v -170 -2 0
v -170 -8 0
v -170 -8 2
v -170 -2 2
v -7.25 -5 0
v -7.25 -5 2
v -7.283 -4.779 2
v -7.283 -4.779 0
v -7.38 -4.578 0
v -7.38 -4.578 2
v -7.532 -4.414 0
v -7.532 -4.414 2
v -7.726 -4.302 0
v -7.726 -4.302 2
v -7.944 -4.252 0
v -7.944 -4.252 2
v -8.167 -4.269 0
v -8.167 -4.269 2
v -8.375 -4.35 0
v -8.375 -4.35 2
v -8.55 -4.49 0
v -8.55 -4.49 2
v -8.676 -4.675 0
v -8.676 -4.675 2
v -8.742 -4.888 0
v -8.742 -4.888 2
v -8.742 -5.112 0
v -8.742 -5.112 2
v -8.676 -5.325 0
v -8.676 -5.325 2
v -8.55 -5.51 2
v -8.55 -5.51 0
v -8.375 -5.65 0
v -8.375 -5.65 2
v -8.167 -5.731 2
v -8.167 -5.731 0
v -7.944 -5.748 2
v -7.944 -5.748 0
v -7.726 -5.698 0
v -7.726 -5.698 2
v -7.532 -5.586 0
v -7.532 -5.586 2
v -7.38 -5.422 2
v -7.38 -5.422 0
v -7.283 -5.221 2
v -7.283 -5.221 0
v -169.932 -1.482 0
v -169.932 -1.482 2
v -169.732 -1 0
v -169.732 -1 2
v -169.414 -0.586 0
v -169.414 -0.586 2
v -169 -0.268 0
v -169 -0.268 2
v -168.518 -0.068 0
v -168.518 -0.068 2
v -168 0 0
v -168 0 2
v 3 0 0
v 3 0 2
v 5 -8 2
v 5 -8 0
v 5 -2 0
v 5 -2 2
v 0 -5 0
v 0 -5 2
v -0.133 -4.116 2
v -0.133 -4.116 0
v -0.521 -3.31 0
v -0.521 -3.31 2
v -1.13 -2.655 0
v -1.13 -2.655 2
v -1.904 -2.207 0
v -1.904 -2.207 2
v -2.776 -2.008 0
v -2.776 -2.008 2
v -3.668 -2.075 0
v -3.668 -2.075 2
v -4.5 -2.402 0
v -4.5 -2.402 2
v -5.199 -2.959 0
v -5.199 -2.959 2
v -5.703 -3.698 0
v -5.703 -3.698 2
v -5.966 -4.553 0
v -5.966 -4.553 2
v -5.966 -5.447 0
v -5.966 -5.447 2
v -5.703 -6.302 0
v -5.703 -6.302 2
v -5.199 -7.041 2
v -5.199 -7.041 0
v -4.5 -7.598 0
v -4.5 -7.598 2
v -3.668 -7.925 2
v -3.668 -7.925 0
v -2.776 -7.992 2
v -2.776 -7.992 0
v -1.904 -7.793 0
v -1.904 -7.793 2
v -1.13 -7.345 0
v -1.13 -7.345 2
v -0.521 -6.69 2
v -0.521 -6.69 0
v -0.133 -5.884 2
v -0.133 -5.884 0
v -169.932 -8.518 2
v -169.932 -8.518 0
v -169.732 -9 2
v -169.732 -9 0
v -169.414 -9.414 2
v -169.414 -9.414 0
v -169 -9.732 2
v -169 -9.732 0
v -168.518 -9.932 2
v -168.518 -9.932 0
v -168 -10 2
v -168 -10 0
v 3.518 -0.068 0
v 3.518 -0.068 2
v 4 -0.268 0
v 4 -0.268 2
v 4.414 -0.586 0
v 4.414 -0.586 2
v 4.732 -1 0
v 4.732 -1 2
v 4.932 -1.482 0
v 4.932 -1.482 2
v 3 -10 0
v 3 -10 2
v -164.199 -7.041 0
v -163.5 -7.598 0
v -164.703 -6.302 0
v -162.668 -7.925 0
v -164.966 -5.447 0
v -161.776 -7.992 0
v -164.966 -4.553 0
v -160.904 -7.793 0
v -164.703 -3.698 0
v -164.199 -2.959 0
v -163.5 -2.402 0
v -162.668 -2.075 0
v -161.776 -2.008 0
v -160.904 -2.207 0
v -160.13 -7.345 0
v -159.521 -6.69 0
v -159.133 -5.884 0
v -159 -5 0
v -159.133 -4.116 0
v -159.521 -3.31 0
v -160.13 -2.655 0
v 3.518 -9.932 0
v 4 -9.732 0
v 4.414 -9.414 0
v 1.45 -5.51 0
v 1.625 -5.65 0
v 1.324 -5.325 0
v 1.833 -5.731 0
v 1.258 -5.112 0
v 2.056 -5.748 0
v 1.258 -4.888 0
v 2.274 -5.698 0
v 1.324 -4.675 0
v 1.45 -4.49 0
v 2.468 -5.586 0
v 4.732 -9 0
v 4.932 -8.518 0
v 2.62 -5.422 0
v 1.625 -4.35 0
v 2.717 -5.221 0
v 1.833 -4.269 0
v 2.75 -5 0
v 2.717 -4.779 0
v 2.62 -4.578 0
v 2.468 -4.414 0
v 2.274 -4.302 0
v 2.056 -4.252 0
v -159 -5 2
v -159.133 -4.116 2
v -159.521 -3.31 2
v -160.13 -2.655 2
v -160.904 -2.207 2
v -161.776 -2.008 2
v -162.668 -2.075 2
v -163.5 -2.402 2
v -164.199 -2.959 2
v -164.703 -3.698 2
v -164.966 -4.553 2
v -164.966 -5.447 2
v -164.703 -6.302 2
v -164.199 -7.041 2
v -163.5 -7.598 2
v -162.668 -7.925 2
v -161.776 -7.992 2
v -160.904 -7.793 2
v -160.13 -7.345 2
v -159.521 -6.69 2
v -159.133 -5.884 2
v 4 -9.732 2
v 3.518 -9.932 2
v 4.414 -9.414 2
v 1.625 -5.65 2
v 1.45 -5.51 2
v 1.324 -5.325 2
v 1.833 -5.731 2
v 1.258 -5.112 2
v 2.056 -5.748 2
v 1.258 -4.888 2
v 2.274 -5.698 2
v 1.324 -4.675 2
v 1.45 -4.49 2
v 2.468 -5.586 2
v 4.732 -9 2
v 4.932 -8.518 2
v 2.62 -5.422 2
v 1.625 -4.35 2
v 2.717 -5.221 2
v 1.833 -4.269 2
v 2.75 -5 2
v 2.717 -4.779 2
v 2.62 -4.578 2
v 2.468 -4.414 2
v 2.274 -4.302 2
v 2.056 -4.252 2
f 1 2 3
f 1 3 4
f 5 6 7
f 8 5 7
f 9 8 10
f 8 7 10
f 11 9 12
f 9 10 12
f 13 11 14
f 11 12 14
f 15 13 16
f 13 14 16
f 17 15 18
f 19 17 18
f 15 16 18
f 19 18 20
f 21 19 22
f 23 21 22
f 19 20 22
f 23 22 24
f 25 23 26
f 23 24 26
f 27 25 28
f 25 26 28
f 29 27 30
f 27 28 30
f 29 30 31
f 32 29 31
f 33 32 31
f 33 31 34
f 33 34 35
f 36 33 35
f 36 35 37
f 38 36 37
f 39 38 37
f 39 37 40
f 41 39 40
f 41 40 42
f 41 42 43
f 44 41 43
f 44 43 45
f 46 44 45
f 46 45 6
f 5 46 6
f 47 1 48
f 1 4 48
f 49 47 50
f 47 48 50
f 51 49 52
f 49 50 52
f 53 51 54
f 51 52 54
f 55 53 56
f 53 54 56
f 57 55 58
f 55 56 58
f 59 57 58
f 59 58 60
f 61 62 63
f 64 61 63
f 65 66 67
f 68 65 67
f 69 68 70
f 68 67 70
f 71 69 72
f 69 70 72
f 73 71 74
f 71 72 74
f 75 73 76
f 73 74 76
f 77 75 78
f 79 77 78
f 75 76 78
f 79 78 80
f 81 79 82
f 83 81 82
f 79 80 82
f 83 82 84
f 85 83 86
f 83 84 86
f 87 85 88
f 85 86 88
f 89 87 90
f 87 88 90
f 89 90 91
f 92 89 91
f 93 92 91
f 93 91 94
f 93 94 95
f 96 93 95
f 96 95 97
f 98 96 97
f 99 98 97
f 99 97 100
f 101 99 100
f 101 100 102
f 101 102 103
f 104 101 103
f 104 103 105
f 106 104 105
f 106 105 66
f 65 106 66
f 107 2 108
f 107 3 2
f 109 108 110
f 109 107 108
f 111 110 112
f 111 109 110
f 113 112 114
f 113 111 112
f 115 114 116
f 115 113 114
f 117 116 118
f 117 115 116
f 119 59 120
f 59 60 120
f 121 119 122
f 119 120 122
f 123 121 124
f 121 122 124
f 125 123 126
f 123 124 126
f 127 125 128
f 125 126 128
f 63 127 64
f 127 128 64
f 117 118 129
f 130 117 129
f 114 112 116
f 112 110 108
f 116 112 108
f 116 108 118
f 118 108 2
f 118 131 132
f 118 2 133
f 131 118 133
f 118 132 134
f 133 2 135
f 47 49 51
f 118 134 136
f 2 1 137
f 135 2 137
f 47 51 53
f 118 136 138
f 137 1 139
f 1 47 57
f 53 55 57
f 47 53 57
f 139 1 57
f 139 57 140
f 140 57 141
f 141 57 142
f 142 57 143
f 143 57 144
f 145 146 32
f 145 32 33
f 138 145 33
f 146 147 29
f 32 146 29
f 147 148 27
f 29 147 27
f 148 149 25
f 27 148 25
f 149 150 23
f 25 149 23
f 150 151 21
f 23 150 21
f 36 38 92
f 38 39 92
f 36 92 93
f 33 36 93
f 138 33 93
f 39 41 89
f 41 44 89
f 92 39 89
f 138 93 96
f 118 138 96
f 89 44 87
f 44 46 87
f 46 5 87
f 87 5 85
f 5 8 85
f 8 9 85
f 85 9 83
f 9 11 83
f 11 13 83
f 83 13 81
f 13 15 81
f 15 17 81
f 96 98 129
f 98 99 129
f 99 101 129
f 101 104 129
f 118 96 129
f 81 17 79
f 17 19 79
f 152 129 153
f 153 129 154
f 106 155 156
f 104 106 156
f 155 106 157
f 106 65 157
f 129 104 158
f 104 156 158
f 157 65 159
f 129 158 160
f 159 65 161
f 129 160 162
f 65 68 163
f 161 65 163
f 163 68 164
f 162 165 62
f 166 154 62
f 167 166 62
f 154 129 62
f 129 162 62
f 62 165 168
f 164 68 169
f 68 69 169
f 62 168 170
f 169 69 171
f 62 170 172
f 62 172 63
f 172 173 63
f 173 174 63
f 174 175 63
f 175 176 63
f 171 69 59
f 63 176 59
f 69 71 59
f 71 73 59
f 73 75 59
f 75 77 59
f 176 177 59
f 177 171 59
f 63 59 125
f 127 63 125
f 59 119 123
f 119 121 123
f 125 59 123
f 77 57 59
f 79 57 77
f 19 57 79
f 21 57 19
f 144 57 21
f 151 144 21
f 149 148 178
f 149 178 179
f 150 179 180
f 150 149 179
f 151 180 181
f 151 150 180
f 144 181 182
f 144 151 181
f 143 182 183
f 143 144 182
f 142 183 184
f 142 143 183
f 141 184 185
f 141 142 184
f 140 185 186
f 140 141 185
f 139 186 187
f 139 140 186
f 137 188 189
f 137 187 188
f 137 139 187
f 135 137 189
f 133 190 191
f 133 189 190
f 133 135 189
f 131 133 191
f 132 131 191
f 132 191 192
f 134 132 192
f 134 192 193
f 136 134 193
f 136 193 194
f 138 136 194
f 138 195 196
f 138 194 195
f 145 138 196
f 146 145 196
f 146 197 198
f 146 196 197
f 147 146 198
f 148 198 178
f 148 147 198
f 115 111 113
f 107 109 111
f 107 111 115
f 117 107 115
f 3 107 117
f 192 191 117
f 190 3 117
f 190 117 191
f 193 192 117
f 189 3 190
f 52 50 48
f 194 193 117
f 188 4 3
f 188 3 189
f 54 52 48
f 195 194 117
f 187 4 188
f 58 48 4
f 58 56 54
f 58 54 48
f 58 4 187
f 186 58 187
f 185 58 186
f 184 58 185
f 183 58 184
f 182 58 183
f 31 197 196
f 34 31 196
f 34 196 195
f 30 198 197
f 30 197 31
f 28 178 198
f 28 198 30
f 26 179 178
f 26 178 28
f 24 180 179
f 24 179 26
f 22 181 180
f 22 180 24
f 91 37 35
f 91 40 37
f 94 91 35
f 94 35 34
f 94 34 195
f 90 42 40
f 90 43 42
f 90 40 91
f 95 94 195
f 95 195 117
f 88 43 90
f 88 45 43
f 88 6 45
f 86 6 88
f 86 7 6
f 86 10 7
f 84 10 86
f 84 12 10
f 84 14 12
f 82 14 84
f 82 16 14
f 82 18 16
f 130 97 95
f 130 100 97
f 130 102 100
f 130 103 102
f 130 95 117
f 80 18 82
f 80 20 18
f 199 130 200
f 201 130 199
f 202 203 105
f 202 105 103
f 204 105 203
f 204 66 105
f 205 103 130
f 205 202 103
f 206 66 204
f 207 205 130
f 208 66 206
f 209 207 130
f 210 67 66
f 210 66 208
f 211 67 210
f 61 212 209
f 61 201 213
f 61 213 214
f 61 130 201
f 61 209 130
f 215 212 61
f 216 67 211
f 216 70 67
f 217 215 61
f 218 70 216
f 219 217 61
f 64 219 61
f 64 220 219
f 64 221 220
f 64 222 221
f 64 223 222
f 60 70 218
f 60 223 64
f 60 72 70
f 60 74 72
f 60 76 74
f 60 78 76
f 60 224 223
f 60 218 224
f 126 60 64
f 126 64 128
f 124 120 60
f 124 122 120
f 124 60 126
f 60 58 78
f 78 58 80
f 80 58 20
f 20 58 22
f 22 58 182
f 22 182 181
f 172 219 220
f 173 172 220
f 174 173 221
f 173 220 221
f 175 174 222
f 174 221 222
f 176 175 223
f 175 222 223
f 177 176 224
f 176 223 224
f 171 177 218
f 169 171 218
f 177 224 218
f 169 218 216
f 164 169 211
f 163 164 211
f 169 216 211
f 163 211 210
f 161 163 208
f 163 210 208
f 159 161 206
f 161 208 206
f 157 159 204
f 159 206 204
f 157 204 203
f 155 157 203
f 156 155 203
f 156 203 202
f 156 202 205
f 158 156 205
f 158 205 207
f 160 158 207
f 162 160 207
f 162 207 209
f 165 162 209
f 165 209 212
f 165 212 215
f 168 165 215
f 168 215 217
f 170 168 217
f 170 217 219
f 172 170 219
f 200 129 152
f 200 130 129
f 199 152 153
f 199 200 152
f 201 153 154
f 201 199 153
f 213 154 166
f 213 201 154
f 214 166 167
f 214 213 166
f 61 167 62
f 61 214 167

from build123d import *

# Parameters (mm, degrees)
SKETCH_1_W               = 175
SKETCH_1_H               = 10
EXTRUDE_1_DEPTH          = 2
CUT_EXTRUDE_1_DEPTH      = 12
CUT_EXTRUDE_1_DEPTH_BACK = 15
SKETCH_2_R               = 3
SKETCH_3_R               = 3
SKETCH_3_R_2             = 0.75
CUT_EXTRUDE_2_DEPTH      = 10
FILLET_1_R               = 2


with BuildPart() as part:
    # 草图1 → 凸台-拉伸1 (new body)
    with BuildSketch(Plane.XY):
        with Locations((-82.5, -5)):
            Rectangle(SKETCH_1_W, SKETCH_1_H)
    extrude(amount=EXTRUDE_1_DEPTH)

    # 草图2 → 切除-拉伸1 (cut, two sides: drawn at the far end of the back side and taken through both)
    with BuildSketch(Plane.XY.offset(2).offset(-CUT_EXTRUDE_1_DEPTH_BACK)):
        with Locations((-162, -5)):
            Circle(SKETCH_2_R)
    extrude(amount=CUT_EXTRUDE_1_DEPTH + CUT_EXTRUDE_1_DEPTH_BACK, mode=Mode.SUBTRACT)

    # 草图3 → 切除-拉伸2 (cut)
    with BuildSketch(Plane.XY.offset(2)):
        with Locations((-3, -5)):
            Circle(SKETCH_3_R)
        with Locations((-8, -5)):
            Circle(SKETCH_3_R_2)
        with Locations((2, -5)):
            Circle(SKETCH_3_R_2)
    extrude(amount=-CUT_EXTRUDE_2_DEPTH, mode=Mode.SUBTRACT)

    # 圆角1
    fillet_1_edges = [part.edges().sort_by_distance(p)[0] for p in [
        (-170, 0, 1),
        (5, 0, 1),
        (5, -10, 1),
        (-170, -10, 1),
    ]]
    fillet(fillet_1_edges, radius=FILLET_1_R)


solid = part.part
